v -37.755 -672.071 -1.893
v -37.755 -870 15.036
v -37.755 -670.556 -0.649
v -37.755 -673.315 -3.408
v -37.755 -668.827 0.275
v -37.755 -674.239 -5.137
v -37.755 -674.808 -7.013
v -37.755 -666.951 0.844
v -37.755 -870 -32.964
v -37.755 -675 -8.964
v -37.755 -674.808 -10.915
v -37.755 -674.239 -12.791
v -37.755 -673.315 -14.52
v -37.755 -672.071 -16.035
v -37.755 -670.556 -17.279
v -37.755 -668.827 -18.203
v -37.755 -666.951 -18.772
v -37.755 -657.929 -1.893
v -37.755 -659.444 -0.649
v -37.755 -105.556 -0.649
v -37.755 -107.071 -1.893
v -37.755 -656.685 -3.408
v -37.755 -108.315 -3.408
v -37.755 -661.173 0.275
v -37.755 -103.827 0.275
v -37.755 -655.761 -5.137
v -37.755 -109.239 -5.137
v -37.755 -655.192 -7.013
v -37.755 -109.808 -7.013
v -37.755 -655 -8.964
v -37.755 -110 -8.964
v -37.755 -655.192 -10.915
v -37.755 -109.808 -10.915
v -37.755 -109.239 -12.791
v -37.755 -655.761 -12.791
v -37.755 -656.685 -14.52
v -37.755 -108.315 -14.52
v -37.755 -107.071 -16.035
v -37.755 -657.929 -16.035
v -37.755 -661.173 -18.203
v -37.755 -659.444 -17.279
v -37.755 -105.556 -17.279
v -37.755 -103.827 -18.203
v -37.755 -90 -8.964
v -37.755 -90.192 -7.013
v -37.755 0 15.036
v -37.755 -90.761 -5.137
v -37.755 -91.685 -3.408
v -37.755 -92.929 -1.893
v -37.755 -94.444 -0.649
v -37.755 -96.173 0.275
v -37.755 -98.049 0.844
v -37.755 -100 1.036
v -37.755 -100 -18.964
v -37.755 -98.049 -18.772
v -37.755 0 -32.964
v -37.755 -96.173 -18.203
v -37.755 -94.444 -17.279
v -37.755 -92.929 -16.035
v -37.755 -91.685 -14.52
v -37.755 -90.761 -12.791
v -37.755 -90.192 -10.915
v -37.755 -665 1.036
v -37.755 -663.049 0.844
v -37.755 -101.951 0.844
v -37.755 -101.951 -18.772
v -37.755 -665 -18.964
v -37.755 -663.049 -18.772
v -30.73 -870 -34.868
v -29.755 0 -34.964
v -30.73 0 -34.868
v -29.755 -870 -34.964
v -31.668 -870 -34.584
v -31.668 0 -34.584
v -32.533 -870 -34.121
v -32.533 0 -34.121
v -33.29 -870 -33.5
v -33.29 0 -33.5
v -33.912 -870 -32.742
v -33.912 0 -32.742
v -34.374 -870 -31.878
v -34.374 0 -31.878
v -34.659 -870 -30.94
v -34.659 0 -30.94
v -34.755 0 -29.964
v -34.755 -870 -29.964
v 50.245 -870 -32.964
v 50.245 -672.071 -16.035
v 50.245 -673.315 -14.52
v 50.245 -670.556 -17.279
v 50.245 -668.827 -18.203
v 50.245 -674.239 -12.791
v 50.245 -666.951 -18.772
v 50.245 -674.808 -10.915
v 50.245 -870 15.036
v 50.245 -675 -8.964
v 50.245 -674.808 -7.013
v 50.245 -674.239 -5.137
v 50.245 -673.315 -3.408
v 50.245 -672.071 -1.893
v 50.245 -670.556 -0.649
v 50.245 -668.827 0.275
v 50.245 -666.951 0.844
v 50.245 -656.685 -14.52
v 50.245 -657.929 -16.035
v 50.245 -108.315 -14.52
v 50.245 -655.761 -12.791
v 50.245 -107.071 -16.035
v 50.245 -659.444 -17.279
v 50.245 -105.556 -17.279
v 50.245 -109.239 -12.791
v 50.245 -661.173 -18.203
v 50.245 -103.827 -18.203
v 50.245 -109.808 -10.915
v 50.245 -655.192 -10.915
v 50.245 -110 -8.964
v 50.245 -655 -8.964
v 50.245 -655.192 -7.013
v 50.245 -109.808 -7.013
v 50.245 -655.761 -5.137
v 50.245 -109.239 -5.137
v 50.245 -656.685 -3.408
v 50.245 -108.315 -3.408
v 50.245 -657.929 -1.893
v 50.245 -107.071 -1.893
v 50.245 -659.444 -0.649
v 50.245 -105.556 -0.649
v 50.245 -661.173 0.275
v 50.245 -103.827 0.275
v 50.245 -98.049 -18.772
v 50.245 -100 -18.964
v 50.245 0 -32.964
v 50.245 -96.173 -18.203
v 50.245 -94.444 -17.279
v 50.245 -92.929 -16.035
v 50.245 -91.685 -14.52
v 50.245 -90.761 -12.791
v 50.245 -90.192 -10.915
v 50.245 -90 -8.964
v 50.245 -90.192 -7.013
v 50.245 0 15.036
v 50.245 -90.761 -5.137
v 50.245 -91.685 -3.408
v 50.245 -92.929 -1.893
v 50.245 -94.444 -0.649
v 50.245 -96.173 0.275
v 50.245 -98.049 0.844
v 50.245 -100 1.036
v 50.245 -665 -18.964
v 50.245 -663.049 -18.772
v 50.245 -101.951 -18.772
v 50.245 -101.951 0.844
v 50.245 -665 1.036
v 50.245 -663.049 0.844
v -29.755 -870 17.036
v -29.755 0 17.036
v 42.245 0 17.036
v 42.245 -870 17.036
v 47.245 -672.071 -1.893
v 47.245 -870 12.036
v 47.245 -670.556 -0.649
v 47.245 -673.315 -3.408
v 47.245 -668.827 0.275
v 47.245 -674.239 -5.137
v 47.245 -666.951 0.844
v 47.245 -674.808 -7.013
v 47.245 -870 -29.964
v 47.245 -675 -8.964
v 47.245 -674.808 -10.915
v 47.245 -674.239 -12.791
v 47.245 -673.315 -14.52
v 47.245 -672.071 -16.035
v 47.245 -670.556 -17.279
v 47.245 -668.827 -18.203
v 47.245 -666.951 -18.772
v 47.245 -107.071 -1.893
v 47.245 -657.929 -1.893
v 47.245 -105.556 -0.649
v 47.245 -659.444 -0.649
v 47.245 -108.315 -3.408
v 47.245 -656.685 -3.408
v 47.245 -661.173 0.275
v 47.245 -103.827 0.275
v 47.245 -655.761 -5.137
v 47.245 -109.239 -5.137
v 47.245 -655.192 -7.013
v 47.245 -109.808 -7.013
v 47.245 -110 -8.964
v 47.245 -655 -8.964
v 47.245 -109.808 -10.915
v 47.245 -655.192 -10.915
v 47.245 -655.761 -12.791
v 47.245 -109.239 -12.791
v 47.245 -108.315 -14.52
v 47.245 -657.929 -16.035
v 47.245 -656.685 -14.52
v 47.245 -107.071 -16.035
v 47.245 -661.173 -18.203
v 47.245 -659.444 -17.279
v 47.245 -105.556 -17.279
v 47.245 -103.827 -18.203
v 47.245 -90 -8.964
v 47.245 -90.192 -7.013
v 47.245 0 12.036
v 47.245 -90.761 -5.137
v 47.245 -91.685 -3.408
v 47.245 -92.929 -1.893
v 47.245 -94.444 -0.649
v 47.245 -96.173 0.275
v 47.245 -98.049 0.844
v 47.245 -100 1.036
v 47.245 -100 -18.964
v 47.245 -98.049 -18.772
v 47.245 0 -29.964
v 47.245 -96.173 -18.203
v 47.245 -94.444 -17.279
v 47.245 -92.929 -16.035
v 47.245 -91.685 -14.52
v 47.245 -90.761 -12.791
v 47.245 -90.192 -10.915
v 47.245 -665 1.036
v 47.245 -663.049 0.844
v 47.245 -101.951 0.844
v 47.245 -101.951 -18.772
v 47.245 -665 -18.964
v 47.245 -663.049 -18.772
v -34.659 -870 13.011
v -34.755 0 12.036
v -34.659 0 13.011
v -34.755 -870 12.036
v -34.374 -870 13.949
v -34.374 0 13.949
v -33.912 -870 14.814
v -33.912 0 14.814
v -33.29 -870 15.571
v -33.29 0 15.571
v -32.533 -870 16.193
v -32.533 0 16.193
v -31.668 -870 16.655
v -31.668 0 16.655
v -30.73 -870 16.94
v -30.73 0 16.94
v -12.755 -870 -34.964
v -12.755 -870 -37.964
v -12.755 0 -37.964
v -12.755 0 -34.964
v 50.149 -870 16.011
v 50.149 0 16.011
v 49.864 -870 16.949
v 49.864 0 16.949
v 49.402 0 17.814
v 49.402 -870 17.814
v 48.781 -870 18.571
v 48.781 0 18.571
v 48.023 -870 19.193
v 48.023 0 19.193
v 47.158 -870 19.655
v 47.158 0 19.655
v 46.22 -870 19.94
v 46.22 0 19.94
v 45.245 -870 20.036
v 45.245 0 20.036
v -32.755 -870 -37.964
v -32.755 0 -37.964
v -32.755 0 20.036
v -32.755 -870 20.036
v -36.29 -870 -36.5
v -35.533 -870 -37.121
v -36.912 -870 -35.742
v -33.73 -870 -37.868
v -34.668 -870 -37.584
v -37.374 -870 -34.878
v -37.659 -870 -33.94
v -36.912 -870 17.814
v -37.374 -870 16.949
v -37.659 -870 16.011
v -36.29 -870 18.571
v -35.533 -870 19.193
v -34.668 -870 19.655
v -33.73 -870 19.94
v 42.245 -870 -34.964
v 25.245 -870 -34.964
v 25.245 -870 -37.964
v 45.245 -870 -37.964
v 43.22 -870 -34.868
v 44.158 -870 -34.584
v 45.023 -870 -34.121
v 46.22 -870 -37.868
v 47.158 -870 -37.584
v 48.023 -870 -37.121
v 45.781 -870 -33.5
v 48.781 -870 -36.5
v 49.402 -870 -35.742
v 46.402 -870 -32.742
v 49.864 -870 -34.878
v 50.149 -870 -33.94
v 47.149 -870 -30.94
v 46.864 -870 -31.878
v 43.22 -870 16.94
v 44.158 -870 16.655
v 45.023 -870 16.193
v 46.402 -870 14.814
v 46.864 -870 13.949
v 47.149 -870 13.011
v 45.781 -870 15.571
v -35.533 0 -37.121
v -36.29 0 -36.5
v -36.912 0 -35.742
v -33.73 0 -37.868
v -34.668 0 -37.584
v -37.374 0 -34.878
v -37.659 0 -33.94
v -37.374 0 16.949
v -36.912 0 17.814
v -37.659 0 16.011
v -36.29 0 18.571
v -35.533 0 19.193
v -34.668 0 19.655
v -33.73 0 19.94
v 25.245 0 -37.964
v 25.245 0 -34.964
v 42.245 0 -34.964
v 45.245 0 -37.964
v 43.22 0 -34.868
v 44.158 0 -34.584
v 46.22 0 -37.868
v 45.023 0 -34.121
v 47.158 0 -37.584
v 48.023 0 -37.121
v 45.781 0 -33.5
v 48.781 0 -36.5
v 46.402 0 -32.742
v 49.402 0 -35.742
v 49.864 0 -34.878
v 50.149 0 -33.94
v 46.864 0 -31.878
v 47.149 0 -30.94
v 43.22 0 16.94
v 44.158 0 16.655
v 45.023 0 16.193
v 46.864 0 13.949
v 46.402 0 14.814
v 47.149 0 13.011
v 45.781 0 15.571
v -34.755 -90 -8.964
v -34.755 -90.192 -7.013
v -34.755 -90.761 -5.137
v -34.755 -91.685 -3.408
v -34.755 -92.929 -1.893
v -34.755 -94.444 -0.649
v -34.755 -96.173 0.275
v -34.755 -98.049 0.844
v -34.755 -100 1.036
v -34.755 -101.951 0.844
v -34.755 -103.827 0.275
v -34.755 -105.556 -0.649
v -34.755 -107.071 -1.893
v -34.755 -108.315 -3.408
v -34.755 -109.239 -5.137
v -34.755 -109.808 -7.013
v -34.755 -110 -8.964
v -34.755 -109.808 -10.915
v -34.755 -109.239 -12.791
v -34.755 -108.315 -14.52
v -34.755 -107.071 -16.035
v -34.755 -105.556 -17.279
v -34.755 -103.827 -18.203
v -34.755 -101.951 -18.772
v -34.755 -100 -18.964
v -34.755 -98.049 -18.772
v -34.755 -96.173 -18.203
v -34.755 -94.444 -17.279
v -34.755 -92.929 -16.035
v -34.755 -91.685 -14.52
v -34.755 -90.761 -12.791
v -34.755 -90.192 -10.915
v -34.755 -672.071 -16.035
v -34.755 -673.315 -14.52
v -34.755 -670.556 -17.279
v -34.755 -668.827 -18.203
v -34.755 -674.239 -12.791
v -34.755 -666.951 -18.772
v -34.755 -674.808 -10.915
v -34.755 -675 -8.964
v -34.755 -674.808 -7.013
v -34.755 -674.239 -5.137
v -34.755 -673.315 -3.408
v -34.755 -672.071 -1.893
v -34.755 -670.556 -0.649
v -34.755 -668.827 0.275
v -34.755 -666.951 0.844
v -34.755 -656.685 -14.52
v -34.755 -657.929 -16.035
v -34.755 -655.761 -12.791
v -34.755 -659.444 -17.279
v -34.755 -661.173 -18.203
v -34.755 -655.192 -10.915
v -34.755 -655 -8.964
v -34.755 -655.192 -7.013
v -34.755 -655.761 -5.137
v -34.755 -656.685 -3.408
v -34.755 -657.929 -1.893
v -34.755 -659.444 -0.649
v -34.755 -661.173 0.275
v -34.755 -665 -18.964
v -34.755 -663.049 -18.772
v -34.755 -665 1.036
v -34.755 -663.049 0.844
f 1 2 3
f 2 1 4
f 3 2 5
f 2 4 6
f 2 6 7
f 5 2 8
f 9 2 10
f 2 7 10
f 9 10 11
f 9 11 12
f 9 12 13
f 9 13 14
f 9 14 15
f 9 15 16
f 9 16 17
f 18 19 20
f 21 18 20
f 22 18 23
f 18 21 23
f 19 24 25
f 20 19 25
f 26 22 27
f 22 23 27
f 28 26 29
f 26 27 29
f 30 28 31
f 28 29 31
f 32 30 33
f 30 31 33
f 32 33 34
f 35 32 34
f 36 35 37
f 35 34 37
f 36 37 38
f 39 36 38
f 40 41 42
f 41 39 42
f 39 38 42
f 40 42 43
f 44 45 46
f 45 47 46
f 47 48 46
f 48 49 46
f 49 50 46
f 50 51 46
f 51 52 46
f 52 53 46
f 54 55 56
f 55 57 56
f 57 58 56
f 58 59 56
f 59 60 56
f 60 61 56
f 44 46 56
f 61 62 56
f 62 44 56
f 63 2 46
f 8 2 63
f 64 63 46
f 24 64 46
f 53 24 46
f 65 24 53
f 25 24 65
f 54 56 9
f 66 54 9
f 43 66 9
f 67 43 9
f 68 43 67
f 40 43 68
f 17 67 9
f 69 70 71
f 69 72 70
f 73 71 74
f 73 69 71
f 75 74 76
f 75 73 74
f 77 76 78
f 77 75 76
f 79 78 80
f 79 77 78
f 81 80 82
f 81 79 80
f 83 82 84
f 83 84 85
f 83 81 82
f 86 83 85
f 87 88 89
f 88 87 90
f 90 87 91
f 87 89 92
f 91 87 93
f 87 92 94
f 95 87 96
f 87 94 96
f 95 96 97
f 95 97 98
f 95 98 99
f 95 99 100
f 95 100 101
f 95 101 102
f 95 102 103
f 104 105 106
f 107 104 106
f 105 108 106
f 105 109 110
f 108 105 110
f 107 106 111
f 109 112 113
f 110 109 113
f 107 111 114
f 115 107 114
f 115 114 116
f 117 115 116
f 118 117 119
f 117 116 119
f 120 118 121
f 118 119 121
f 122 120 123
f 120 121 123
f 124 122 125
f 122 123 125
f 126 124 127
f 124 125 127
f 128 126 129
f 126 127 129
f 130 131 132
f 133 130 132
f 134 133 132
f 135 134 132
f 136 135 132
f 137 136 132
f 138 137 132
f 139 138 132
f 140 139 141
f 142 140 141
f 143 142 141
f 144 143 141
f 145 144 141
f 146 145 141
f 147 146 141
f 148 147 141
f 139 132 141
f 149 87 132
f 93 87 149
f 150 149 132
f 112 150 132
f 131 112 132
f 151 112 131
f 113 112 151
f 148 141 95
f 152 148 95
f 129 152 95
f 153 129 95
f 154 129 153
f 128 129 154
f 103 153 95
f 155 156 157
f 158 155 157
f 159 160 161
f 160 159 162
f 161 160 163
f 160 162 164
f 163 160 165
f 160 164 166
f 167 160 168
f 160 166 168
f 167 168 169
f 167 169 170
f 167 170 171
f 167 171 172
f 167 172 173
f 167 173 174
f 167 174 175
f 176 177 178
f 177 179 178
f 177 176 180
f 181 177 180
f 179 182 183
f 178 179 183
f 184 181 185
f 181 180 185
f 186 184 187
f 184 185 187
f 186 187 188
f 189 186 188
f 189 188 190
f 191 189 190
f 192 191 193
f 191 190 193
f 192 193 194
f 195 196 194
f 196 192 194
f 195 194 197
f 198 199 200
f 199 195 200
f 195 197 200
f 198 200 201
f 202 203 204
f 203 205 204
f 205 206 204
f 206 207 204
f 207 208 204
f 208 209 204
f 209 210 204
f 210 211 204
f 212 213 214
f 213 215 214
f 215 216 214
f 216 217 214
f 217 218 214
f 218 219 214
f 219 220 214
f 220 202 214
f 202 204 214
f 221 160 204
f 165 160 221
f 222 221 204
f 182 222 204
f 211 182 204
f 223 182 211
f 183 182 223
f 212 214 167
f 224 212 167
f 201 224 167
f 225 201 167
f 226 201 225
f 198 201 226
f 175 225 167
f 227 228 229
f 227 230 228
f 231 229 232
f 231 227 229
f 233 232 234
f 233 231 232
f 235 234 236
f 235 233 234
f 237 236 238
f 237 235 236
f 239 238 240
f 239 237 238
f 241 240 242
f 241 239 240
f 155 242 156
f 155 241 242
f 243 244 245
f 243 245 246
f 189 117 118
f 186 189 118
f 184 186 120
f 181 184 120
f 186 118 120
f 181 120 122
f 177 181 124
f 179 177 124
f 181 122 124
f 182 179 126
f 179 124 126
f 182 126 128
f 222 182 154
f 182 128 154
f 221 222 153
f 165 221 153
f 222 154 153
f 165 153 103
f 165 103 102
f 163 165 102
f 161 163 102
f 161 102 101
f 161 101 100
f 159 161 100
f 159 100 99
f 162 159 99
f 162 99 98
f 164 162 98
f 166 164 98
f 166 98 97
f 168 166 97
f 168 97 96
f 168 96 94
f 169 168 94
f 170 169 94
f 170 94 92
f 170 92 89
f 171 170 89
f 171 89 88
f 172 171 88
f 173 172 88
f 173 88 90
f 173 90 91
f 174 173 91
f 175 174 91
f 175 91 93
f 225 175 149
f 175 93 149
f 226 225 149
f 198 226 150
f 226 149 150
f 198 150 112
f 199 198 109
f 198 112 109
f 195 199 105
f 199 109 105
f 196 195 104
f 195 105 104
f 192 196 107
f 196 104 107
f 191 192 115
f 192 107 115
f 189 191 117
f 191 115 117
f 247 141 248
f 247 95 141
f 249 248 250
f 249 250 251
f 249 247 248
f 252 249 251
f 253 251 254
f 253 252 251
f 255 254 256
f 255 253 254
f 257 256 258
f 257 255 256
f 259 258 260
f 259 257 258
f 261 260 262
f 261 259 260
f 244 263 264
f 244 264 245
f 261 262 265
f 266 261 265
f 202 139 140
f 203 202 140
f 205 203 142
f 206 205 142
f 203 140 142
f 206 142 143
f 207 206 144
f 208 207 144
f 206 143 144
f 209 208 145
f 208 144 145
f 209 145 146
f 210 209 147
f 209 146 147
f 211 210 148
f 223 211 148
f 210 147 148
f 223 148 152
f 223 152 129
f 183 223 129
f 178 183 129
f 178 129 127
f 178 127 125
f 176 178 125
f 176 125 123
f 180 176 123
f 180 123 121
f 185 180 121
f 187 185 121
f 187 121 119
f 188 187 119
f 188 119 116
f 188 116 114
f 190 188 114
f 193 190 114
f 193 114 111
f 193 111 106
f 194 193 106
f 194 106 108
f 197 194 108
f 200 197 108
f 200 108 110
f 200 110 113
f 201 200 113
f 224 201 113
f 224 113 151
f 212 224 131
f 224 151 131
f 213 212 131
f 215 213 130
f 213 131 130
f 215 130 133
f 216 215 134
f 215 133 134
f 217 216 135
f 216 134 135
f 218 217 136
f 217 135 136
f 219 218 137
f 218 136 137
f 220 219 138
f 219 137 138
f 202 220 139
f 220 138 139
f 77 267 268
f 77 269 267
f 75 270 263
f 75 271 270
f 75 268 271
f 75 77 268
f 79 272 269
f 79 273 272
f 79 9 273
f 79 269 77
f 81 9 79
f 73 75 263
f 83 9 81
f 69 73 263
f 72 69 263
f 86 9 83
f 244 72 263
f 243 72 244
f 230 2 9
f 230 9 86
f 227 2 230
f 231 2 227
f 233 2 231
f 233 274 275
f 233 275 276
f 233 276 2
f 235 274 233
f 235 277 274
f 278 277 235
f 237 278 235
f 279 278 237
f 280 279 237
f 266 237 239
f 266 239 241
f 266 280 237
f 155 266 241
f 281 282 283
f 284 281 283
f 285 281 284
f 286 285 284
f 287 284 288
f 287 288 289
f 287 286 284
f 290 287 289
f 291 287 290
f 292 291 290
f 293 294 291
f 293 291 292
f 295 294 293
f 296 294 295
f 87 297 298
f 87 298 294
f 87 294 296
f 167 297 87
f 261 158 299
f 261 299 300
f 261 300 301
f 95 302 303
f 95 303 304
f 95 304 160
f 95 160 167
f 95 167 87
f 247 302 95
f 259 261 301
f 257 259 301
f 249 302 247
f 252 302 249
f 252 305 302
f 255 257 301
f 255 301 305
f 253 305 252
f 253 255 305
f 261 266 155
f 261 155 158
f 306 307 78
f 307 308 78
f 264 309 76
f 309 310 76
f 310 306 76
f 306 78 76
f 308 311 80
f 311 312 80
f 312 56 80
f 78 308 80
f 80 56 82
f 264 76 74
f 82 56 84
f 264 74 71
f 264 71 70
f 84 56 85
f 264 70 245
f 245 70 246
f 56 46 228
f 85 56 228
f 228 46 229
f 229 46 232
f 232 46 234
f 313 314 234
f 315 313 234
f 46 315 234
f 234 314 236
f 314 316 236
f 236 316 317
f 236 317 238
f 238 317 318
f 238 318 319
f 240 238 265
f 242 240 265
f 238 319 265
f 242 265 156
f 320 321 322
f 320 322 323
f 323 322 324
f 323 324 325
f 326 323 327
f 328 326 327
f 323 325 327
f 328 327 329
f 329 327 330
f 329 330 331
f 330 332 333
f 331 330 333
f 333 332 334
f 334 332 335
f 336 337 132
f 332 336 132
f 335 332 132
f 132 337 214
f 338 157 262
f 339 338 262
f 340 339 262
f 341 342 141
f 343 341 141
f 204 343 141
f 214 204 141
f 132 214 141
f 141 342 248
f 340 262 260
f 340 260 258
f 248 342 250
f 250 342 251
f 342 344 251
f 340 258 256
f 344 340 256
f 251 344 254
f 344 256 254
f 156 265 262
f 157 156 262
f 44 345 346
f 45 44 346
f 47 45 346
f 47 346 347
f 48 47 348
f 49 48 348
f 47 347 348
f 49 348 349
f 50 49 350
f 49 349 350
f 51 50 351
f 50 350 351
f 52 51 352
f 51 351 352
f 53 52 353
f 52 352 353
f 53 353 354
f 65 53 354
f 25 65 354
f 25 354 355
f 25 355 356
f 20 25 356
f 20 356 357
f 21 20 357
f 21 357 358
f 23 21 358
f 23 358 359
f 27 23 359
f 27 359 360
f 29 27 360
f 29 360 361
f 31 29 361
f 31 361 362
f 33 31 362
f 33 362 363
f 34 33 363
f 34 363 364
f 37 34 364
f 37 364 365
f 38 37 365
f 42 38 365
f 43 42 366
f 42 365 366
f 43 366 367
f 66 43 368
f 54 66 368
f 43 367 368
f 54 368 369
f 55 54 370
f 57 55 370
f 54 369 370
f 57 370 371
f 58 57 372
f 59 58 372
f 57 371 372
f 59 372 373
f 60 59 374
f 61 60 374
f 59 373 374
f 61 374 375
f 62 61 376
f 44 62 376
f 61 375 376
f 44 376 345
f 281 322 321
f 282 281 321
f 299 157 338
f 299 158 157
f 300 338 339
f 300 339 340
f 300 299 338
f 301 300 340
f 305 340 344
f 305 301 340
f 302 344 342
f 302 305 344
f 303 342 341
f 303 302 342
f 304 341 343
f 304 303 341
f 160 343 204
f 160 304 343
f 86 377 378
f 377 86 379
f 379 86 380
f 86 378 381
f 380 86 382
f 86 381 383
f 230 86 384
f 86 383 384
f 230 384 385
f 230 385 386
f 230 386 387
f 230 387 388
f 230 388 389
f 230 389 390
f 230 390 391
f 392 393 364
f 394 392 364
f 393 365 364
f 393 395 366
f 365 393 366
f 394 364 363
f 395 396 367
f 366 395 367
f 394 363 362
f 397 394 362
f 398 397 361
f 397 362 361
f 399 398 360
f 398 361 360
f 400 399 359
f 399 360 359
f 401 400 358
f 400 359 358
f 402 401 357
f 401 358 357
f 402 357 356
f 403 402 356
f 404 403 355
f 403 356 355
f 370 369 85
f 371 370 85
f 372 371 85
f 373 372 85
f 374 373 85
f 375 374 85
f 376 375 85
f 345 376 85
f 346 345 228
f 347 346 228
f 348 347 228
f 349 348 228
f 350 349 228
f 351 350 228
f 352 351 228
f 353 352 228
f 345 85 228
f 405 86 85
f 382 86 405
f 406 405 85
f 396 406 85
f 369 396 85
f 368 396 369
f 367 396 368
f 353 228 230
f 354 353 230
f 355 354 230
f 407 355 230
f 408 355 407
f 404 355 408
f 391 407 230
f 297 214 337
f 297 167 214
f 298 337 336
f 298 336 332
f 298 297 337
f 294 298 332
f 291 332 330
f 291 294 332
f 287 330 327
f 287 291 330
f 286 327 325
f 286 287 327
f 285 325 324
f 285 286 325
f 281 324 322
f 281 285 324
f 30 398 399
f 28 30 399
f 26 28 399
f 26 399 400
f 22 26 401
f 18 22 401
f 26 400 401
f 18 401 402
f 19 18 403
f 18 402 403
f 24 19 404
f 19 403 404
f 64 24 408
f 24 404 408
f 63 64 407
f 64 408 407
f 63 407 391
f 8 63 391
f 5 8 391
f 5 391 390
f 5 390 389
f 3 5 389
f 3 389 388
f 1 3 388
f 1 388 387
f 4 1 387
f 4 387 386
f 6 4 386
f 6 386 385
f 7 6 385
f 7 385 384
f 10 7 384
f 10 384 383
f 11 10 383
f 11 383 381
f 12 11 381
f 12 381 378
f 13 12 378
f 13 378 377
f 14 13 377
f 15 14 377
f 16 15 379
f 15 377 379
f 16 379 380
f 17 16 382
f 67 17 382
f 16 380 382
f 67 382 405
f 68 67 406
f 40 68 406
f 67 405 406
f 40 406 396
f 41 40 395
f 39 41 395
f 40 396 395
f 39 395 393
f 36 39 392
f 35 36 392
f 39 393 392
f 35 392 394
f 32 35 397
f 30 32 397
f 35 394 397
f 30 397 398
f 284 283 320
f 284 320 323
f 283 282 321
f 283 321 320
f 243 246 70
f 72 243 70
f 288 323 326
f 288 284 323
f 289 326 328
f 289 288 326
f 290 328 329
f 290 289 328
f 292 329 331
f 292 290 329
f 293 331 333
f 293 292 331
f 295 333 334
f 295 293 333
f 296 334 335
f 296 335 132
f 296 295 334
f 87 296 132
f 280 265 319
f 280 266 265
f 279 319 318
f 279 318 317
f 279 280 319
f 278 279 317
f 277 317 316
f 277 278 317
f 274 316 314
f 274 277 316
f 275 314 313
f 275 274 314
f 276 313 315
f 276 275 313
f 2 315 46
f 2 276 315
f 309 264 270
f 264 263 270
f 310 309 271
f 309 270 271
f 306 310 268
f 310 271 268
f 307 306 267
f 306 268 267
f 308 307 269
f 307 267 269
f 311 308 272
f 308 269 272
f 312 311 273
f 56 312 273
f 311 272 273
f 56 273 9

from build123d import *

# Parameters (mm, degrees)
F1_DEPTH = 870
F2_R     = 5
F3_R     = 5
F4_R     = 10
F5_DEPTH = 88.001


with BuildPart() as f1:
    # F0 (on Front) → F1 (new body)
    with BuildSketch(Plane.XZ):
        Polygon((-37.754953, -37.964115), (-12.754953, -37.964115), (-12.754953, -34.964115), (-34.754953, -34.964115), (-34.754953, 17.035885), (47.245047, 17.035885), (47.245047, -34.964115), (25.245047, -34.964115), (25.245047, -37.964115), (50.245047, -37.964115), (50.245047, 20.035885), (-37.754953, 20.035885), align=None)
    extrude(amount=F1_DEPTH)

    # F2
    f2_edges = [f1.edges().sort_by_distance(p)[0] for p in [
        (-37.754953, -435, 20.035885),
        (50.245047, -435, 20.035885),
        (-37.754953, -435, -37.964115),
        (50.245047, -435, -37.964115),
    ]]
    fillet(f2_edges, radius=F2_R)

    # F3
    f3_edges = [f1.edges().sort_by_distance(p)[0] for p in [
        (47.245047, -435, -34.964115),
        (47.245047, -435, 17.035885),
        (-34.754953, -435, -34.964115),
        (-34.754953, -435, 17.035885),
    ]]
    fillet(f3_edges, radius=F3_R)

    # F4 (on face) → F5 (cut, through all)
    with BuildSketch(Plane.YZ.offset(50.245047)):
        with Locations((-665, -8.964115)):
            Circle(F4_R)
        with Locations((-100, -8.964115)):
            Circle(F4_R)
    extrude(amount=-F5_DEPTH, mode=Mode.SUBTRACT)


solid = f1.part
